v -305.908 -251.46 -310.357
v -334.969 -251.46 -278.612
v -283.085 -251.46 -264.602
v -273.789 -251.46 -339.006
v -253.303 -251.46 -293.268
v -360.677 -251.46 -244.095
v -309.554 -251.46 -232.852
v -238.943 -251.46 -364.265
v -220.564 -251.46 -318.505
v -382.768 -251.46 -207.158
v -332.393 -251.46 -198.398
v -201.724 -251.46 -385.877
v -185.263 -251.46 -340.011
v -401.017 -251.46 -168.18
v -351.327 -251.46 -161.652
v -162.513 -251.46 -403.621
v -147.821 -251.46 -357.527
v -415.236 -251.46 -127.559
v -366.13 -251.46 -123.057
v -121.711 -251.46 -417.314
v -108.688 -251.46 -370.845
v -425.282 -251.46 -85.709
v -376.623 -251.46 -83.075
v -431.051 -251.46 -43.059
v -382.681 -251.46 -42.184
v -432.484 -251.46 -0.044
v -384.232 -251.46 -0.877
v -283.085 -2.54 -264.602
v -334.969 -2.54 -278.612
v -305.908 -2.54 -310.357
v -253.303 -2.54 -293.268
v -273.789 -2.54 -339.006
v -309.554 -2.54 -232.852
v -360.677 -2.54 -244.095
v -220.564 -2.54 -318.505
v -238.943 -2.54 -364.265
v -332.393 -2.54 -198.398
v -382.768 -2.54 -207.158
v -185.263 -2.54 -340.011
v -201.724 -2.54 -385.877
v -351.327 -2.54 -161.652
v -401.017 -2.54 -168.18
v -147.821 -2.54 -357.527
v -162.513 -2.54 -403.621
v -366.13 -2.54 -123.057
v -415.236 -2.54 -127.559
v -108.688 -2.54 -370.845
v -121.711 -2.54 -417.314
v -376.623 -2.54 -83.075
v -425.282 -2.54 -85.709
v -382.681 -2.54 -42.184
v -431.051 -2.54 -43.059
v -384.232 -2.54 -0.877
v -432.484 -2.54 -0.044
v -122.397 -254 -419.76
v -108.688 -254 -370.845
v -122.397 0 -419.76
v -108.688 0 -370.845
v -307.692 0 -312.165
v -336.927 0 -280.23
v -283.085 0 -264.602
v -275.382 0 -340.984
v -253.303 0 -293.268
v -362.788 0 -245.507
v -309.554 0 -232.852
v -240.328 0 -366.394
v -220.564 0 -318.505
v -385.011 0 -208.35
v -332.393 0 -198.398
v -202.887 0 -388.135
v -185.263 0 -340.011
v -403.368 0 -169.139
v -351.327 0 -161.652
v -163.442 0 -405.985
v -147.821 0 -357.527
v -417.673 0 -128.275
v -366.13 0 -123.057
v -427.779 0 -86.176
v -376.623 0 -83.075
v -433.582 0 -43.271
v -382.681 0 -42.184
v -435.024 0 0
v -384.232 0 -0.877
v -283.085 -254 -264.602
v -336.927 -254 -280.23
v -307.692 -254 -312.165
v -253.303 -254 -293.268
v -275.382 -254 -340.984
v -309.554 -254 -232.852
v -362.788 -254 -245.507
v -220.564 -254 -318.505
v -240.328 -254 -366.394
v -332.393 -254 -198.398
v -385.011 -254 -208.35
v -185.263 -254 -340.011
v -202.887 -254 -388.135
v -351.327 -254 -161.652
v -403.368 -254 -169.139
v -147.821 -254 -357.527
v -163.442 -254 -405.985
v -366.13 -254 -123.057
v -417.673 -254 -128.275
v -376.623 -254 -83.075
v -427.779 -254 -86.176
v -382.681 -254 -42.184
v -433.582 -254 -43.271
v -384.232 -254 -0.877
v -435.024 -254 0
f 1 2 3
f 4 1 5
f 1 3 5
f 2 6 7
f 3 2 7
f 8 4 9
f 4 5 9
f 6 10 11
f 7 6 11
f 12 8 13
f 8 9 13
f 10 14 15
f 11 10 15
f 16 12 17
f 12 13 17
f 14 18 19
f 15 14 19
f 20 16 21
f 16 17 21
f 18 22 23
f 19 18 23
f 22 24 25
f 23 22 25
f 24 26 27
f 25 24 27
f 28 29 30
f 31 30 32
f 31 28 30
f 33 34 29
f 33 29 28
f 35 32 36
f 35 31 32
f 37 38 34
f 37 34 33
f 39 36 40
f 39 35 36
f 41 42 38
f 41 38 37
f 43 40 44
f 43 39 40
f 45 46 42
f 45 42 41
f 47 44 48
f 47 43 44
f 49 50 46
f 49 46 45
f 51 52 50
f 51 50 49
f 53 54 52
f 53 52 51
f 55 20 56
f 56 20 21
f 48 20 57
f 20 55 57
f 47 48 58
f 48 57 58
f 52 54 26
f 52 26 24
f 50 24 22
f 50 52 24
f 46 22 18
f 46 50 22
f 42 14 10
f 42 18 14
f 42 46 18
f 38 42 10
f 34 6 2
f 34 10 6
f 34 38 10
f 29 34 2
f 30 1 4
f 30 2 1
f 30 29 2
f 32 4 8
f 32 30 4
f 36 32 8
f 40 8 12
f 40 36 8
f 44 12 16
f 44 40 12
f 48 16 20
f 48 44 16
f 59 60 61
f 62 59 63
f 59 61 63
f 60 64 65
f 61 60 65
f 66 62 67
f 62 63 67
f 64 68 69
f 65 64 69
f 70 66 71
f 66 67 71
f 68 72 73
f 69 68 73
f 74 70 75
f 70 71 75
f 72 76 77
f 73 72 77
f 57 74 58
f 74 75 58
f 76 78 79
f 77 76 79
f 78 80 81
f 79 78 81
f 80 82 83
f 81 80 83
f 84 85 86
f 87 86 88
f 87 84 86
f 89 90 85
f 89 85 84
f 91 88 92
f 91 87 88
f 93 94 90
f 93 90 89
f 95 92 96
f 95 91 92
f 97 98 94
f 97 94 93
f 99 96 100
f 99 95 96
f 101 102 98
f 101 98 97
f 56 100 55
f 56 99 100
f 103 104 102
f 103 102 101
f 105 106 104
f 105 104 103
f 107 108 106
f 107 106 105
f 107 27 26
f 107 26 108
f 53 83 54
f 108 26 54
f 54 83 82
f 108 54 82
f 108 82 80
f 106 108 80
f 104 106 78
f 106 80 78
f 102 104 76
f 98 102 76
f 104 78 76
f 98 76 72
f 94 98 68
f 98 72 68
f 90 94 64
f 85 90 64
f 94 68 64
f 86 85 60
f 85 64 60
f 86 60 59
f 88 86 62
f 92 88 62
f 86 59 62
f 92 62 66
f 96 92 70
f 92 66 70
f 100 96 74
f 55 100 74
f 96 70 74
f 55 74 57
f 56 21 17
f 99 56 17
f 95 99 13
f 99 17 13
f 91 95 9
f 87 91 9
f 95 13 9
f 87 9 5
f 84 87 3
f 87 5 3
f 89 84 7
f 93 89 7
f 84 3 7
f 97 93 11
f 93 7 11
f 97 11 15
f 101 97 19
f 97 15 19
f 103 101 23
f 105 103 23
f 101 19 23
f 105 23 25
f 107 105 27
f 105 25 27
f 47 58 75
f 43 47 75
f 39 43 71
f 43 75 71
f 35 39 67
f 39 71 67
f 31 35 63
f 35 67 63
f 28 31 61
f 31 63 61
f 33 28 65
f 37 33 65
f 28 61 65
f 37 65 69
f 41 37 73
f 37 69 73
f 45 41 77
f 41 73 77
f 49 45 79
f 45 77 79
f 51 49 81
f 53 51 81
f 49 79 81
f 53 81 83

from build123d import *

# Parameters (mm, degrees)
F1_DEPTH = 254
F2_T     = -2.54


with BuildPart() as f1:
    # F0 (on Front) → F1 (new body)
    with BuildSketch(Plane.XZ):
        with BuildLine():
            Line((-384.231603, -0.877004), (-435.024024, 0))
            ThreePointArc((-435.024024, 0), (-350.2964, -263.195684), (-122.396574, -419.76007))
            Line((-122.396574, -419.76007), (-108.688443, -370.844568))
            ThreePointArc((-108.688443, -370.844568), (-309.554484, -232.852061), (-384.231603, -0.877004))
        make_face()
    extrude(amount=F1_DEPTH)

    # F2
    f2_openings = [f1.faces().sort_by_distance(p)[0] for p in [
        (-309.554484, -127, -232.852061),
        (-115.542508, -127, -395.302319),
        (-409.627814, -127, -0.438502),
    ]]
    offset(amount=F2_T, openings=f2_openings)


solid = f1.part
